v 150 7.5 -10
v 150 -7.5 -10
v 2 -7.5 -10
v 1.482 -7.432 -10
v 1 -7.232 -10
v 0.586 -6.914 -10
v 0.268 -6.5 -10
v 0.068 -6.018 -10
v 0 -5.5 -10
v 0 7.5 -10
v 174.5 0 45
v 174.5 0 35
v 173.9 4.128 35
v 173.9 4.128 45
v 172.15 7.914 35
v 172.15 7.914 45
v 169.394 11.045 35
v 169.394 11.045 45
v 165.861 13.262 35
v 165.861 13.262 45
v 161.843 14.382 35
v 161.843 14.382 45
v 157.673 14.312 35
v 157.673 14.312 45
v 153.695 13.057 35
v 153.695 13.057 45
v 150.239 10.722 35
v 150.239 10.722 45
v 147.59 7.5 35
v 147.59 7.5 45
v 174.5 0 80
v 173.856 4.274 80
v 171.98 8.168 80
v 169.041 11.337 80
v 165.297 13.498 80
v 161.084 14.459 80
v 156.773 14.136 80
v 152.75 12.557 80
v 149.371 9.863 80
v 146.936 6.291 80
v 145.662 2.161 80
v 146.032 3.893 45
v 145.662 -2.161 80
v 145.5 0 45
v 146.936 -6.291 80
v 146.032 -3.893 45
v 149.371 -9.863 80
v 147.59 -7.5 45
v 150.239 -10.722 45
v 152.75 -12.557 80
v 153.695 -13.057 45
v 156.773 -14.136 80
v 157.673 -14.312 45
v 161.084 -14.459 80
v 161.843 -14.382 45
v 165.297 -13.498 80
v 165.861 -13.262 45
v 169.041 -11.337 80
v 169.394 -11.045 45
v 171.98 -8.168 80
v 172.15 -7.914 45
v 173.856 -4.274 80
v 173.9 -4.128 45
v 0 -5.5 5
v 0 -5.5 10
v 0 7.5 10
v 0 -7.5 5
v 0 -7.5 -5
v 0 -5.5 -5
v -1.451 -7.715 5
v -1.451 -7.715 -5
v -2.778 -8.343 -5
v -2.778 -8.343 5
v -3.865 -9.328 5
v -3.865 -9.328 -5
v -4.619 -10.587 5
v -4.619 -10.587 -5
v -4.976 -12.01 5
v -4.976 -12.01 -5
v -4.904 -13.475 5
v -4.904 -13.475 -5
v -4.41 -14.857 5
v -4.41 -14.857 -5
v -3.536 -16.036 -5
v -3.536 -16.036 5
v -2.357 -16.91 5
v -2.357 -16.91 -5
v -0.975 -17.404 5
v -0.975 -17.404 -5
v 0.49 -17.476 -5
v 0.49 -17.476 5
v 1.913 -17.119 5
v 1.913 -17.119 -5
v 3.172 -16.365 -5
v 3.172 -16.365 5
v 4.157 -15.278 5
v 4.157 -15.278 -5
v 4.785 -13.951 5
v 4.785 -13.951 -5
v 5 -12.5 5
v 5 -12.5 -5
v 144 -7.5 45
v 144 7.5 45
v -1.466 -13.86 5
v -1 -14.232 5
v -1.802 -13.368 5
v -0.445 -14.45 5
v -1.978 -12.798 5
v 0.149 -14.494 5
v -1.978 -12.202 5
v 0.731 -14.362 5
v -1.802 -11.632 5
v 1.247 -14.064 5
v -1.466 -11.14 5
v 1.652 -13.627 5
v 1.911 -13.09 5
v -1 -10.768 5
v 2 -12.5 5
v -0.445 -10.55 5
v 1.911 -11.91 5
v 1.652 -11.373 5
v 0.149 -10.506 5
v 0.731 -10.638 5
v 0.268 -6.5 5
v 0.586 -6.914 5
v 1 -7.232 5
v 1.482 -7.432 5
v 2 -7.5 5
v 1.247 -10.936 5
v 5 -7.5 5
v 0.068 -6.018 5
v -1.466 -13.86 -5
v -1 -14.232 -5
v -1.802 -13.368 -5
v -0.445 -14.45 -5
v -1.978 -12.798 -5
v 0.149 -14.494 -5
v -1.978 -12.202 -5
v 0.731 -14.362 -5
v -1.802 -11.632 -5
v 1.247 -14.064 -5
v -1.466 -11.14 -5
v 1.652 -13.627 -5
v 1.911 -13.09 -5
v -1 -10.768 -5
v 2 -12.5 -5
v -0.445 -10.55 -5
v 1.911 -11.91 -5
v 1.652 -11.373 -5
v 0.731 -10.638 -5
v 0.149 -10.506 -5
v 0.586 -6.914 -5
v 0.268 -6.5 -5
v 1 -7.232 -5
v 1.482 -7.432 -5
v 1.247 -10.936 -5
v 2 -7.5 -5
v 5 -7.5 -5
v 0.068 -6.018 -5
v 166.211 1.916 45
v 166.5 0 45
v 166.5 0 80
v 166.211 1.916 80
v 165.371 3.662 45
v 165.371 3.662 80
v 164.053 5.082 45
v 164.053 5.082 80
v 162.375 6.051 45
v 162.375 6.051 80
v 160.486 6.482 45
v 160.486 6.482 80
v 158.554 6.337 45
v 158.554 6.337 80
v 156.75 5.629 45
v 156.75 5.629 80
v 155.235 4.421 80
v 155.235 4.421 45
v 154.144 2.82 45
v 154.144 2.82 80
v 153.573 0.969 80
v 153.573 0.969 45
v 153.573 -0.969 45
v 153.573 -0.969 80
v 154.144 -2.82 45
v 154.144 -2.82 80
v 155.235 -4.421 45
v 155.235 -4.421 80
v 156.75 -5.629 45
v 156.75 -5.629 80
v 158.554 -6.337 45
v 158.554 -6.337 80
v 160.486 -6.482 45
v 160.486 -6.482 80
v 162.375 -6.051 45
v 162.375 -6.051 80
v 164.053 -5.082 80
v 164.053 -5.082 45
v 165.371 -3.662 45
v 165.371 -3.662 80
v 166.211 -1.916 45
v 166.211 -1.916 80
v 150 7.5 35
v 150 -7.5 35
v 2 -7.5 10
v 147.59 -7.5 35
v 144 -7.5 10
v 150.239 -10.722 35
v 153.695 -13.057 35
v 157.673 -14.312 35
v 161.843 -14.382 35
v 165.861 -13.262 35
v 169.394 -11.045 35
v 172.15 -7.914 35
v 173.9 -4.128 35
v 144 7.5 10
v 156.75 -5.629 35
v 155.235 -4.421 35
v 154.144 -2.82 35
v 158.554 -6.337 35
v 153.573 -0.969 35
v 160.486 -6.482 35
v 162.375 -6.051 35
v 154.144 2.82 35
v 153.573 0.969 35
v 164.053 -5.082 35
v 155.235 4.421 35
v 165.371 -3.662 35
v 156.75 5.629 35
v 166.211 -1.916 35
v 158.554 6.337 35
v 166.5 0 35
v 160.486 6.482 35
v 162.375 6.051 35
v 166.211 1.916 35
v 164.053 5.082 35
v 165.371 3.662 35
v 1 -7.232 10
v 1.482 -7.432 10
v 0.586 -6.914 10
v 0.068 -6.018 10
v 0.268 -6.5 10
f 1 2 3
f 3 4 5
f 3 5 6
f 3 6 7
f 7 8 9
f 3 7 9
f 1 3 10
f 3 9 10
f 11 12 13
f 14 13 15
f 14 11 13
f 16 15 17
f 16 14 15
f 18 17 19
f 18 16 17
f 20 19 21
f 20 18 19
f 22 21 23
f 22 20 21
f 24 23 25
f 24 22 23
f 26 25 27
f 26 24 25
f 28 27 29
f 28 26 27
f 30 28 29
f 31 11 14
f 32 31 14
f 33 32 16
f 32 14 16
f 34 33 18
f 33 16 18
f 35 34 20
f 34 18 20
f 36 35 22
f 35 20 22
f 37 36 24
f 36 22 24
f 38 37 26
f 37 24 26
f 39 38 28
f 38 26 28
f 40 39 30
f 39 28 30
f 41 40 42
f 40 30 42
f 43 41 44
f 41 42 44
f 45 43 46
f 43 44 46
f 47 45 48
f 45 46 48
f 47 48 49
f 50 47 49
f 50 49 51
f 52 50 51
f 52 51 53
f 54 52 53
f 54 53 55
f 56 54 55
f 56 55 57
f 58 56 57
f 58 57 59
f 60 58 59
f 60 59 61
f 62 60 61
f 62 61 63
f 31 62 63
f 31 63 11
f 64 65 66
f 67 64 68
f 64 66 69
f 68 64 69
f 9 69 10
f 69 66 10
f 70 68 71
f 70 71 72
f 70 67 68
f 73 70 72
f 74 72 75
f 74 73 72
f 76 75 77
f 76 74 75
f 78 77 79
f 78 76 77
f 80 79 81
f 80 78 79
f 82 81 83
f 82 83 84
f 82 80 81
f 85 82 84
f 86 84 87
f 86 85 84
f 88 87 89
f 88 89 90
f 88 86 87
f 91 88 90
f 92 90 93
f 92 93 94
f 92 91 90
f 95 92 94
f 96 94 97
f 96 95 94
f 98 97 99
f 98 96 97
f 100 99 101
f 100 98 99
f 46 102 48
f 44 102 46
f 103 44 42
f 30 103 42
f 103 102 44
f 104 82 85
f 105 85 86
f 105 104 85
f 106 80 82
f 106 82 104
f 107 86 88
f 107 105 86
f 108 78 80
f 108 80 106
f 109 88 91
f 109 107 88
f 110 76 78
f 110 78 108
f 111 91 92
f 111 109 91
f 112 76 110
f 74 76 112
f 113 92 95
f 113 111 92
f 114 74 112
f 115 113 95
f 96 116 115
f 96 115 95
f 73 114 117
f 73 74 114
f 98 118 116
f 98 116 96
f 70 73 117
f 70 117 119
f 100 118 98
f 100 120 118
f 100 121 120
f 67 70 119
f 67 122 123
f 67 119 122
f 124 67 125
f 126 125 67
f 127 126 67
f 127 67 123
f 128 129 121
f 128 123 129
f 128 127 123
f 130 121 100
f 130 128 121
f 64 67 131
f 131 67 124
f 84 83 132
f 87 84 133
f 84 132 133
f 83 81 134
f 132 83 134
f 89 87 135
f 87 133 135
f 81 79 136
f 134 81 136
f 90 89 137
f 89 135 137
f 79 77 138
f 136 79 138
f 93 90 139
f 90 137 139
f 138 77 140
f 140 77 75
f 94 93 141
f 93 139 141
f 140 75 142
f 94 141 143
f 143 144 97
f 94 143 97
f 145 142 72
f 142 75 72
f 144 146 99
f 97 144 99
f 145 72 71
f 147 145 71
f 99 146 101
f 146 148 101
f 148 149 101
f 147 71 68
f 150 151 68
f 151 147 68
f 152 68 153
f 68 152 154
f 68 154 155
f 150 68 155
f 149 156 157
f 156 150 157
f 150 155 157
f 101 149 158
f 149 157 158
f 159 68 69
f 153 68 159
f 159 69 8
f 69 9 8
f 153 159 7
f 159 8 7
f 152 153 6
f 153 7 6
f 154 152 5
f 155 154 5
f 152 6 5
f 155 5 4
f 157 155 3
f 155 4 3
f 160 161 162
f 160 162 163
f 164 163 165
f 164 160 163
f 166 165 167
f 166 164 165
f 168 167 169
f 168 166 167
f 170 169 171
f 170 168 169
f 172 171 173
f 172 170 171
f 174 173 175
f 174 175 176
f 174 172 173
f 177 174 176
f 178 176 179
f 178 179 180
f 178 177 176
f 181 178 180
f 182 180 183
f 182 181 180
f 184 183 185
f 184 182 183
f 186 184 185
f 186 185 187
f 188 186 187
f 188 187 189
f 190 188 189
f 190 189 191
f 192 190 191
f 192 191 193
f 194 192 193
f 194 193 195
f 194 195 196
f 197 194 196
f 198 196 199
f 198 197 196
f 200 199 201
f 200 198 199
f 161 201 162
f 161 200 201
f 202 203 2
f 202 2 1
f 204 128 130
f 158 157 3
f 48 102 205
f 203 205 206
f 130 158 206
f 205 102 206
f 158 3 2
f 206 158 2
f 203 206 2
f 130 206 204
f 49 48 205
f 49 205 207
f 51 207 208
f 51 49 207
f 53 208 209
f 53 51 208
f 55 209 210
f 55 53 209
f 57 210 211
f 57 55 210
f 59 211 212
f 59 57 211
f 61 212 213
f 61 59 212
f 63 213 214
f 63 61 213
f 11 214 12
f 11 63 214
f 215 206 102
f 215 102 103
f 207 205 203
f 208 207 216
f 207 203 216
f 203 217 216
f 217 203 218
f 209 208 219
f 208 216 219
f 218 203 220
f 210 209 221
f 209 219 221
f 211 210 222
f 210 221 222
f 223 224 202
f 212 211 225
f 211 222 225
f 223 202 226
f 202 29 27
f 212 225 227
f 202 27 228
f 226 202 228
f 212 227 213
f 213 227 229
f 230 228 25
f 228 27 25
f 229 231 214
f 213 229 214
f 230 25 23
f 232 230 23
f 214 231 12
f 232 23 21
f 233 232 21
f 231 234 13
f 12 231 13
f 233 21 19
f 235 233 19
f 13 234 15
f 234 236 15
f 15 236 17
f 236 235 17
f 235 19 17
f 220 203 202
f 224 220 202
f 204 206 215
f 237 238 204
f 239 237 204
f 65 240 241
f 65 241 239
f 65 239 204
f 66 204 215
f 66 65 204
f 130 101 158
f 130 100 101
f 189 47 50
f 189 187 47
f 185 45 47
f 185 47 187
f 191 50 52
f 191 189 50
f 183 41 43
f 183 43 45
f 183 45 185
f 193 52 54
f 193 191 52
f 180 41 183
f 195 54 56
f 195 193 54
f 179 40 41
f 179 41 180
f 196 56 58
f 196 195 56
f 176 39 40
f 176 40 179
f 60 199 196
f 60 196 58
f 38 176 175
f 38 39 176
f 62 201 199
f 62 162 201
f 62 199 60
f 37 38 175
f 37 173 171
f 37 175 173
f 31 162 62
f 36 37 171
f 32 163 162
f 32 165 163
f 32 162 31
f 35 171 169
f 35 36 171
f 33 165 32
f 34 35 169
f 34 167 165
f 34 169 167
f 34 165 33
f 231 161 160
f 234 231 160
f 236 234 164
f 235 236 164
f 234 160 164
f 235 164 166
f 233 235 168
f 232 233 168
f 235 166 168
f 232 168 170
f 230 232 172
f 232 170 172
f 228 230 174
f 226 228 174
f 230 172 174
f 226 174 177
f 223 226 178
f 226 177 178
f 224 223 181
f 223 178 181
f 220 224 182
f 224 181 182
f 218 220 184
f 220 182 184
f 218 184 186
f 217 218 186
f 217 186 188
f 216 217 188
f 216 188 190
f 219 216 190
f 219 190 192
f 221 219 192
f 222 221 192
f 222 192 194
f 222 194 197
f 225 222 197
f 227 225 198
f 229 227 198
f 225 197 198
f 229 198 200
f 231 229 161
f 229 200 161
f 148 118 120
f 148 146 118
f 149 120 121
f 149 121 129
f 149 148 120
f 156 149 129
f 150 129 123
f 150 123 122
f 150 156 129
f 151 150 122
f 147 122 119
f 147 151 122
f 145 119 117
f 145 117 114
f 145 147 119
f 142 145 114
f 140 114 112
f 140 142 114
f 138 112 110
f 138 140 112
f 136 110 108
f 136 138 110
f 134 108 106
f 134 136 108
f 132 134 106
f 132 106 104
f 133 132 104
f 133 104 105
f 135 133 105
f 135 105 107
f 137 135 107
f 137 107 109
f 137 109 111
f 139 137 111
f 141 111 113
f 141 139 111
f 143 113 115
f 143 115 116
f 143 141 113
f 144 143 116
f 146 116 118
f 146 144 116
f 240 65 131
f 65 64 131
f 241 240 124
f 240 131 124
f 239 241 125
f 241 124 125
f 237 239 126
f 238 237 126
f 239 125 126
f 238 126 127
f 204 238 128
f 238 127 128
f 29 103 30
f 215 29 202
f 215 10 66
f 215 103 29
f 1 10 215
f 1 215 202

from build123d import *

# Parameters (mm, degrees)
SKETCH4_W                = 20
SKETCH4_H                = 15
BOSS_EXTRUDE1_DEPTH      = 150
SKETCH5_W                = 6
SKETCH5_H                = 15
BOSS_EXTRUDE2_DEPTH      = 35
SKETCH6_R                = 14.5
SKETCH6_R_2              = 6.5
BOSS_EXTRUDE3_DEPTH      = 35
BOSS_EXTRUDE3_DEPTH_BACK = 10
SKETCH7_R                = 2
BOSS_EXTRUDE4_DEPTH      = 5
FILLET1_R                = 2


with BuildPart() as part:
    # Sketch4 → Boss-Extrude1 (new body)
    with BuildSketch(Plane(origin=(0, 0, 0), x_dir=(0, 0, -1), z_dir=(1, 0, 0))):
        Rectangle(SKETCH4_W, SKETCH4_H)
    extrude(amount=BOSS_EXTRUDE1_DEPTH)

    # Sketch5 → Boss-Extrude2 (add)
    with BuildSketch(Plane.XY.offset(10)):
        with Locations((147, 0)):
            Rectangle(SKETCH5_W, SKETCH5_H)
    extrude(amount=BOSS_EXTRUDE2_DEPTH)

    # Sketch6 → Boss-Extrude3 (add, two sides)
    with BuildSketch(Plane.XY.offset(45)) as boss_extrude3_sk:
        with Locations((160, 0)):
            Circle(SKETCH6_R)
        with Locations((160, 0)):
            Circle(SKETCH6_R_2, mode=Mode.SUBTRACT)
    extrude(amount=BOSS_EXTRUDE3_DEPTH)
    extrude(boss_extrude3_sk.sketch, amount=-BOSS_EXTRUDE3_DEPTH_BACK)

    # Sketch7 → Boss-Extrude4 (add, symmetric)
    with BuildSketch(Plane.XY):
        with BuildLine():
            Line((5, -12.5), (5, -7.5))
            Line((5, -7.5), (0, -7.5))
            ThreePointArc((0, -7.5), (-3.535533906, -16.035533906), (5, -12.5))
        make_face()
        with Locations((0, -12.5)):
            Circle(SKETCH7_R, mode=Mode.SUBTRACT)
    extrude(amount=BOSS_EXTRUDE4_DEPTH, both=True)

    # Fillet1
    fillet1_edges = [part.edges().sort_by_distance(p)[0] for p in [
        (0, -7.5, -7.5),
        (0, -7.5, 7.5),
    ]]
    fillet(fillet1_edges, radius=FILLET1_R)


solid = part.part
